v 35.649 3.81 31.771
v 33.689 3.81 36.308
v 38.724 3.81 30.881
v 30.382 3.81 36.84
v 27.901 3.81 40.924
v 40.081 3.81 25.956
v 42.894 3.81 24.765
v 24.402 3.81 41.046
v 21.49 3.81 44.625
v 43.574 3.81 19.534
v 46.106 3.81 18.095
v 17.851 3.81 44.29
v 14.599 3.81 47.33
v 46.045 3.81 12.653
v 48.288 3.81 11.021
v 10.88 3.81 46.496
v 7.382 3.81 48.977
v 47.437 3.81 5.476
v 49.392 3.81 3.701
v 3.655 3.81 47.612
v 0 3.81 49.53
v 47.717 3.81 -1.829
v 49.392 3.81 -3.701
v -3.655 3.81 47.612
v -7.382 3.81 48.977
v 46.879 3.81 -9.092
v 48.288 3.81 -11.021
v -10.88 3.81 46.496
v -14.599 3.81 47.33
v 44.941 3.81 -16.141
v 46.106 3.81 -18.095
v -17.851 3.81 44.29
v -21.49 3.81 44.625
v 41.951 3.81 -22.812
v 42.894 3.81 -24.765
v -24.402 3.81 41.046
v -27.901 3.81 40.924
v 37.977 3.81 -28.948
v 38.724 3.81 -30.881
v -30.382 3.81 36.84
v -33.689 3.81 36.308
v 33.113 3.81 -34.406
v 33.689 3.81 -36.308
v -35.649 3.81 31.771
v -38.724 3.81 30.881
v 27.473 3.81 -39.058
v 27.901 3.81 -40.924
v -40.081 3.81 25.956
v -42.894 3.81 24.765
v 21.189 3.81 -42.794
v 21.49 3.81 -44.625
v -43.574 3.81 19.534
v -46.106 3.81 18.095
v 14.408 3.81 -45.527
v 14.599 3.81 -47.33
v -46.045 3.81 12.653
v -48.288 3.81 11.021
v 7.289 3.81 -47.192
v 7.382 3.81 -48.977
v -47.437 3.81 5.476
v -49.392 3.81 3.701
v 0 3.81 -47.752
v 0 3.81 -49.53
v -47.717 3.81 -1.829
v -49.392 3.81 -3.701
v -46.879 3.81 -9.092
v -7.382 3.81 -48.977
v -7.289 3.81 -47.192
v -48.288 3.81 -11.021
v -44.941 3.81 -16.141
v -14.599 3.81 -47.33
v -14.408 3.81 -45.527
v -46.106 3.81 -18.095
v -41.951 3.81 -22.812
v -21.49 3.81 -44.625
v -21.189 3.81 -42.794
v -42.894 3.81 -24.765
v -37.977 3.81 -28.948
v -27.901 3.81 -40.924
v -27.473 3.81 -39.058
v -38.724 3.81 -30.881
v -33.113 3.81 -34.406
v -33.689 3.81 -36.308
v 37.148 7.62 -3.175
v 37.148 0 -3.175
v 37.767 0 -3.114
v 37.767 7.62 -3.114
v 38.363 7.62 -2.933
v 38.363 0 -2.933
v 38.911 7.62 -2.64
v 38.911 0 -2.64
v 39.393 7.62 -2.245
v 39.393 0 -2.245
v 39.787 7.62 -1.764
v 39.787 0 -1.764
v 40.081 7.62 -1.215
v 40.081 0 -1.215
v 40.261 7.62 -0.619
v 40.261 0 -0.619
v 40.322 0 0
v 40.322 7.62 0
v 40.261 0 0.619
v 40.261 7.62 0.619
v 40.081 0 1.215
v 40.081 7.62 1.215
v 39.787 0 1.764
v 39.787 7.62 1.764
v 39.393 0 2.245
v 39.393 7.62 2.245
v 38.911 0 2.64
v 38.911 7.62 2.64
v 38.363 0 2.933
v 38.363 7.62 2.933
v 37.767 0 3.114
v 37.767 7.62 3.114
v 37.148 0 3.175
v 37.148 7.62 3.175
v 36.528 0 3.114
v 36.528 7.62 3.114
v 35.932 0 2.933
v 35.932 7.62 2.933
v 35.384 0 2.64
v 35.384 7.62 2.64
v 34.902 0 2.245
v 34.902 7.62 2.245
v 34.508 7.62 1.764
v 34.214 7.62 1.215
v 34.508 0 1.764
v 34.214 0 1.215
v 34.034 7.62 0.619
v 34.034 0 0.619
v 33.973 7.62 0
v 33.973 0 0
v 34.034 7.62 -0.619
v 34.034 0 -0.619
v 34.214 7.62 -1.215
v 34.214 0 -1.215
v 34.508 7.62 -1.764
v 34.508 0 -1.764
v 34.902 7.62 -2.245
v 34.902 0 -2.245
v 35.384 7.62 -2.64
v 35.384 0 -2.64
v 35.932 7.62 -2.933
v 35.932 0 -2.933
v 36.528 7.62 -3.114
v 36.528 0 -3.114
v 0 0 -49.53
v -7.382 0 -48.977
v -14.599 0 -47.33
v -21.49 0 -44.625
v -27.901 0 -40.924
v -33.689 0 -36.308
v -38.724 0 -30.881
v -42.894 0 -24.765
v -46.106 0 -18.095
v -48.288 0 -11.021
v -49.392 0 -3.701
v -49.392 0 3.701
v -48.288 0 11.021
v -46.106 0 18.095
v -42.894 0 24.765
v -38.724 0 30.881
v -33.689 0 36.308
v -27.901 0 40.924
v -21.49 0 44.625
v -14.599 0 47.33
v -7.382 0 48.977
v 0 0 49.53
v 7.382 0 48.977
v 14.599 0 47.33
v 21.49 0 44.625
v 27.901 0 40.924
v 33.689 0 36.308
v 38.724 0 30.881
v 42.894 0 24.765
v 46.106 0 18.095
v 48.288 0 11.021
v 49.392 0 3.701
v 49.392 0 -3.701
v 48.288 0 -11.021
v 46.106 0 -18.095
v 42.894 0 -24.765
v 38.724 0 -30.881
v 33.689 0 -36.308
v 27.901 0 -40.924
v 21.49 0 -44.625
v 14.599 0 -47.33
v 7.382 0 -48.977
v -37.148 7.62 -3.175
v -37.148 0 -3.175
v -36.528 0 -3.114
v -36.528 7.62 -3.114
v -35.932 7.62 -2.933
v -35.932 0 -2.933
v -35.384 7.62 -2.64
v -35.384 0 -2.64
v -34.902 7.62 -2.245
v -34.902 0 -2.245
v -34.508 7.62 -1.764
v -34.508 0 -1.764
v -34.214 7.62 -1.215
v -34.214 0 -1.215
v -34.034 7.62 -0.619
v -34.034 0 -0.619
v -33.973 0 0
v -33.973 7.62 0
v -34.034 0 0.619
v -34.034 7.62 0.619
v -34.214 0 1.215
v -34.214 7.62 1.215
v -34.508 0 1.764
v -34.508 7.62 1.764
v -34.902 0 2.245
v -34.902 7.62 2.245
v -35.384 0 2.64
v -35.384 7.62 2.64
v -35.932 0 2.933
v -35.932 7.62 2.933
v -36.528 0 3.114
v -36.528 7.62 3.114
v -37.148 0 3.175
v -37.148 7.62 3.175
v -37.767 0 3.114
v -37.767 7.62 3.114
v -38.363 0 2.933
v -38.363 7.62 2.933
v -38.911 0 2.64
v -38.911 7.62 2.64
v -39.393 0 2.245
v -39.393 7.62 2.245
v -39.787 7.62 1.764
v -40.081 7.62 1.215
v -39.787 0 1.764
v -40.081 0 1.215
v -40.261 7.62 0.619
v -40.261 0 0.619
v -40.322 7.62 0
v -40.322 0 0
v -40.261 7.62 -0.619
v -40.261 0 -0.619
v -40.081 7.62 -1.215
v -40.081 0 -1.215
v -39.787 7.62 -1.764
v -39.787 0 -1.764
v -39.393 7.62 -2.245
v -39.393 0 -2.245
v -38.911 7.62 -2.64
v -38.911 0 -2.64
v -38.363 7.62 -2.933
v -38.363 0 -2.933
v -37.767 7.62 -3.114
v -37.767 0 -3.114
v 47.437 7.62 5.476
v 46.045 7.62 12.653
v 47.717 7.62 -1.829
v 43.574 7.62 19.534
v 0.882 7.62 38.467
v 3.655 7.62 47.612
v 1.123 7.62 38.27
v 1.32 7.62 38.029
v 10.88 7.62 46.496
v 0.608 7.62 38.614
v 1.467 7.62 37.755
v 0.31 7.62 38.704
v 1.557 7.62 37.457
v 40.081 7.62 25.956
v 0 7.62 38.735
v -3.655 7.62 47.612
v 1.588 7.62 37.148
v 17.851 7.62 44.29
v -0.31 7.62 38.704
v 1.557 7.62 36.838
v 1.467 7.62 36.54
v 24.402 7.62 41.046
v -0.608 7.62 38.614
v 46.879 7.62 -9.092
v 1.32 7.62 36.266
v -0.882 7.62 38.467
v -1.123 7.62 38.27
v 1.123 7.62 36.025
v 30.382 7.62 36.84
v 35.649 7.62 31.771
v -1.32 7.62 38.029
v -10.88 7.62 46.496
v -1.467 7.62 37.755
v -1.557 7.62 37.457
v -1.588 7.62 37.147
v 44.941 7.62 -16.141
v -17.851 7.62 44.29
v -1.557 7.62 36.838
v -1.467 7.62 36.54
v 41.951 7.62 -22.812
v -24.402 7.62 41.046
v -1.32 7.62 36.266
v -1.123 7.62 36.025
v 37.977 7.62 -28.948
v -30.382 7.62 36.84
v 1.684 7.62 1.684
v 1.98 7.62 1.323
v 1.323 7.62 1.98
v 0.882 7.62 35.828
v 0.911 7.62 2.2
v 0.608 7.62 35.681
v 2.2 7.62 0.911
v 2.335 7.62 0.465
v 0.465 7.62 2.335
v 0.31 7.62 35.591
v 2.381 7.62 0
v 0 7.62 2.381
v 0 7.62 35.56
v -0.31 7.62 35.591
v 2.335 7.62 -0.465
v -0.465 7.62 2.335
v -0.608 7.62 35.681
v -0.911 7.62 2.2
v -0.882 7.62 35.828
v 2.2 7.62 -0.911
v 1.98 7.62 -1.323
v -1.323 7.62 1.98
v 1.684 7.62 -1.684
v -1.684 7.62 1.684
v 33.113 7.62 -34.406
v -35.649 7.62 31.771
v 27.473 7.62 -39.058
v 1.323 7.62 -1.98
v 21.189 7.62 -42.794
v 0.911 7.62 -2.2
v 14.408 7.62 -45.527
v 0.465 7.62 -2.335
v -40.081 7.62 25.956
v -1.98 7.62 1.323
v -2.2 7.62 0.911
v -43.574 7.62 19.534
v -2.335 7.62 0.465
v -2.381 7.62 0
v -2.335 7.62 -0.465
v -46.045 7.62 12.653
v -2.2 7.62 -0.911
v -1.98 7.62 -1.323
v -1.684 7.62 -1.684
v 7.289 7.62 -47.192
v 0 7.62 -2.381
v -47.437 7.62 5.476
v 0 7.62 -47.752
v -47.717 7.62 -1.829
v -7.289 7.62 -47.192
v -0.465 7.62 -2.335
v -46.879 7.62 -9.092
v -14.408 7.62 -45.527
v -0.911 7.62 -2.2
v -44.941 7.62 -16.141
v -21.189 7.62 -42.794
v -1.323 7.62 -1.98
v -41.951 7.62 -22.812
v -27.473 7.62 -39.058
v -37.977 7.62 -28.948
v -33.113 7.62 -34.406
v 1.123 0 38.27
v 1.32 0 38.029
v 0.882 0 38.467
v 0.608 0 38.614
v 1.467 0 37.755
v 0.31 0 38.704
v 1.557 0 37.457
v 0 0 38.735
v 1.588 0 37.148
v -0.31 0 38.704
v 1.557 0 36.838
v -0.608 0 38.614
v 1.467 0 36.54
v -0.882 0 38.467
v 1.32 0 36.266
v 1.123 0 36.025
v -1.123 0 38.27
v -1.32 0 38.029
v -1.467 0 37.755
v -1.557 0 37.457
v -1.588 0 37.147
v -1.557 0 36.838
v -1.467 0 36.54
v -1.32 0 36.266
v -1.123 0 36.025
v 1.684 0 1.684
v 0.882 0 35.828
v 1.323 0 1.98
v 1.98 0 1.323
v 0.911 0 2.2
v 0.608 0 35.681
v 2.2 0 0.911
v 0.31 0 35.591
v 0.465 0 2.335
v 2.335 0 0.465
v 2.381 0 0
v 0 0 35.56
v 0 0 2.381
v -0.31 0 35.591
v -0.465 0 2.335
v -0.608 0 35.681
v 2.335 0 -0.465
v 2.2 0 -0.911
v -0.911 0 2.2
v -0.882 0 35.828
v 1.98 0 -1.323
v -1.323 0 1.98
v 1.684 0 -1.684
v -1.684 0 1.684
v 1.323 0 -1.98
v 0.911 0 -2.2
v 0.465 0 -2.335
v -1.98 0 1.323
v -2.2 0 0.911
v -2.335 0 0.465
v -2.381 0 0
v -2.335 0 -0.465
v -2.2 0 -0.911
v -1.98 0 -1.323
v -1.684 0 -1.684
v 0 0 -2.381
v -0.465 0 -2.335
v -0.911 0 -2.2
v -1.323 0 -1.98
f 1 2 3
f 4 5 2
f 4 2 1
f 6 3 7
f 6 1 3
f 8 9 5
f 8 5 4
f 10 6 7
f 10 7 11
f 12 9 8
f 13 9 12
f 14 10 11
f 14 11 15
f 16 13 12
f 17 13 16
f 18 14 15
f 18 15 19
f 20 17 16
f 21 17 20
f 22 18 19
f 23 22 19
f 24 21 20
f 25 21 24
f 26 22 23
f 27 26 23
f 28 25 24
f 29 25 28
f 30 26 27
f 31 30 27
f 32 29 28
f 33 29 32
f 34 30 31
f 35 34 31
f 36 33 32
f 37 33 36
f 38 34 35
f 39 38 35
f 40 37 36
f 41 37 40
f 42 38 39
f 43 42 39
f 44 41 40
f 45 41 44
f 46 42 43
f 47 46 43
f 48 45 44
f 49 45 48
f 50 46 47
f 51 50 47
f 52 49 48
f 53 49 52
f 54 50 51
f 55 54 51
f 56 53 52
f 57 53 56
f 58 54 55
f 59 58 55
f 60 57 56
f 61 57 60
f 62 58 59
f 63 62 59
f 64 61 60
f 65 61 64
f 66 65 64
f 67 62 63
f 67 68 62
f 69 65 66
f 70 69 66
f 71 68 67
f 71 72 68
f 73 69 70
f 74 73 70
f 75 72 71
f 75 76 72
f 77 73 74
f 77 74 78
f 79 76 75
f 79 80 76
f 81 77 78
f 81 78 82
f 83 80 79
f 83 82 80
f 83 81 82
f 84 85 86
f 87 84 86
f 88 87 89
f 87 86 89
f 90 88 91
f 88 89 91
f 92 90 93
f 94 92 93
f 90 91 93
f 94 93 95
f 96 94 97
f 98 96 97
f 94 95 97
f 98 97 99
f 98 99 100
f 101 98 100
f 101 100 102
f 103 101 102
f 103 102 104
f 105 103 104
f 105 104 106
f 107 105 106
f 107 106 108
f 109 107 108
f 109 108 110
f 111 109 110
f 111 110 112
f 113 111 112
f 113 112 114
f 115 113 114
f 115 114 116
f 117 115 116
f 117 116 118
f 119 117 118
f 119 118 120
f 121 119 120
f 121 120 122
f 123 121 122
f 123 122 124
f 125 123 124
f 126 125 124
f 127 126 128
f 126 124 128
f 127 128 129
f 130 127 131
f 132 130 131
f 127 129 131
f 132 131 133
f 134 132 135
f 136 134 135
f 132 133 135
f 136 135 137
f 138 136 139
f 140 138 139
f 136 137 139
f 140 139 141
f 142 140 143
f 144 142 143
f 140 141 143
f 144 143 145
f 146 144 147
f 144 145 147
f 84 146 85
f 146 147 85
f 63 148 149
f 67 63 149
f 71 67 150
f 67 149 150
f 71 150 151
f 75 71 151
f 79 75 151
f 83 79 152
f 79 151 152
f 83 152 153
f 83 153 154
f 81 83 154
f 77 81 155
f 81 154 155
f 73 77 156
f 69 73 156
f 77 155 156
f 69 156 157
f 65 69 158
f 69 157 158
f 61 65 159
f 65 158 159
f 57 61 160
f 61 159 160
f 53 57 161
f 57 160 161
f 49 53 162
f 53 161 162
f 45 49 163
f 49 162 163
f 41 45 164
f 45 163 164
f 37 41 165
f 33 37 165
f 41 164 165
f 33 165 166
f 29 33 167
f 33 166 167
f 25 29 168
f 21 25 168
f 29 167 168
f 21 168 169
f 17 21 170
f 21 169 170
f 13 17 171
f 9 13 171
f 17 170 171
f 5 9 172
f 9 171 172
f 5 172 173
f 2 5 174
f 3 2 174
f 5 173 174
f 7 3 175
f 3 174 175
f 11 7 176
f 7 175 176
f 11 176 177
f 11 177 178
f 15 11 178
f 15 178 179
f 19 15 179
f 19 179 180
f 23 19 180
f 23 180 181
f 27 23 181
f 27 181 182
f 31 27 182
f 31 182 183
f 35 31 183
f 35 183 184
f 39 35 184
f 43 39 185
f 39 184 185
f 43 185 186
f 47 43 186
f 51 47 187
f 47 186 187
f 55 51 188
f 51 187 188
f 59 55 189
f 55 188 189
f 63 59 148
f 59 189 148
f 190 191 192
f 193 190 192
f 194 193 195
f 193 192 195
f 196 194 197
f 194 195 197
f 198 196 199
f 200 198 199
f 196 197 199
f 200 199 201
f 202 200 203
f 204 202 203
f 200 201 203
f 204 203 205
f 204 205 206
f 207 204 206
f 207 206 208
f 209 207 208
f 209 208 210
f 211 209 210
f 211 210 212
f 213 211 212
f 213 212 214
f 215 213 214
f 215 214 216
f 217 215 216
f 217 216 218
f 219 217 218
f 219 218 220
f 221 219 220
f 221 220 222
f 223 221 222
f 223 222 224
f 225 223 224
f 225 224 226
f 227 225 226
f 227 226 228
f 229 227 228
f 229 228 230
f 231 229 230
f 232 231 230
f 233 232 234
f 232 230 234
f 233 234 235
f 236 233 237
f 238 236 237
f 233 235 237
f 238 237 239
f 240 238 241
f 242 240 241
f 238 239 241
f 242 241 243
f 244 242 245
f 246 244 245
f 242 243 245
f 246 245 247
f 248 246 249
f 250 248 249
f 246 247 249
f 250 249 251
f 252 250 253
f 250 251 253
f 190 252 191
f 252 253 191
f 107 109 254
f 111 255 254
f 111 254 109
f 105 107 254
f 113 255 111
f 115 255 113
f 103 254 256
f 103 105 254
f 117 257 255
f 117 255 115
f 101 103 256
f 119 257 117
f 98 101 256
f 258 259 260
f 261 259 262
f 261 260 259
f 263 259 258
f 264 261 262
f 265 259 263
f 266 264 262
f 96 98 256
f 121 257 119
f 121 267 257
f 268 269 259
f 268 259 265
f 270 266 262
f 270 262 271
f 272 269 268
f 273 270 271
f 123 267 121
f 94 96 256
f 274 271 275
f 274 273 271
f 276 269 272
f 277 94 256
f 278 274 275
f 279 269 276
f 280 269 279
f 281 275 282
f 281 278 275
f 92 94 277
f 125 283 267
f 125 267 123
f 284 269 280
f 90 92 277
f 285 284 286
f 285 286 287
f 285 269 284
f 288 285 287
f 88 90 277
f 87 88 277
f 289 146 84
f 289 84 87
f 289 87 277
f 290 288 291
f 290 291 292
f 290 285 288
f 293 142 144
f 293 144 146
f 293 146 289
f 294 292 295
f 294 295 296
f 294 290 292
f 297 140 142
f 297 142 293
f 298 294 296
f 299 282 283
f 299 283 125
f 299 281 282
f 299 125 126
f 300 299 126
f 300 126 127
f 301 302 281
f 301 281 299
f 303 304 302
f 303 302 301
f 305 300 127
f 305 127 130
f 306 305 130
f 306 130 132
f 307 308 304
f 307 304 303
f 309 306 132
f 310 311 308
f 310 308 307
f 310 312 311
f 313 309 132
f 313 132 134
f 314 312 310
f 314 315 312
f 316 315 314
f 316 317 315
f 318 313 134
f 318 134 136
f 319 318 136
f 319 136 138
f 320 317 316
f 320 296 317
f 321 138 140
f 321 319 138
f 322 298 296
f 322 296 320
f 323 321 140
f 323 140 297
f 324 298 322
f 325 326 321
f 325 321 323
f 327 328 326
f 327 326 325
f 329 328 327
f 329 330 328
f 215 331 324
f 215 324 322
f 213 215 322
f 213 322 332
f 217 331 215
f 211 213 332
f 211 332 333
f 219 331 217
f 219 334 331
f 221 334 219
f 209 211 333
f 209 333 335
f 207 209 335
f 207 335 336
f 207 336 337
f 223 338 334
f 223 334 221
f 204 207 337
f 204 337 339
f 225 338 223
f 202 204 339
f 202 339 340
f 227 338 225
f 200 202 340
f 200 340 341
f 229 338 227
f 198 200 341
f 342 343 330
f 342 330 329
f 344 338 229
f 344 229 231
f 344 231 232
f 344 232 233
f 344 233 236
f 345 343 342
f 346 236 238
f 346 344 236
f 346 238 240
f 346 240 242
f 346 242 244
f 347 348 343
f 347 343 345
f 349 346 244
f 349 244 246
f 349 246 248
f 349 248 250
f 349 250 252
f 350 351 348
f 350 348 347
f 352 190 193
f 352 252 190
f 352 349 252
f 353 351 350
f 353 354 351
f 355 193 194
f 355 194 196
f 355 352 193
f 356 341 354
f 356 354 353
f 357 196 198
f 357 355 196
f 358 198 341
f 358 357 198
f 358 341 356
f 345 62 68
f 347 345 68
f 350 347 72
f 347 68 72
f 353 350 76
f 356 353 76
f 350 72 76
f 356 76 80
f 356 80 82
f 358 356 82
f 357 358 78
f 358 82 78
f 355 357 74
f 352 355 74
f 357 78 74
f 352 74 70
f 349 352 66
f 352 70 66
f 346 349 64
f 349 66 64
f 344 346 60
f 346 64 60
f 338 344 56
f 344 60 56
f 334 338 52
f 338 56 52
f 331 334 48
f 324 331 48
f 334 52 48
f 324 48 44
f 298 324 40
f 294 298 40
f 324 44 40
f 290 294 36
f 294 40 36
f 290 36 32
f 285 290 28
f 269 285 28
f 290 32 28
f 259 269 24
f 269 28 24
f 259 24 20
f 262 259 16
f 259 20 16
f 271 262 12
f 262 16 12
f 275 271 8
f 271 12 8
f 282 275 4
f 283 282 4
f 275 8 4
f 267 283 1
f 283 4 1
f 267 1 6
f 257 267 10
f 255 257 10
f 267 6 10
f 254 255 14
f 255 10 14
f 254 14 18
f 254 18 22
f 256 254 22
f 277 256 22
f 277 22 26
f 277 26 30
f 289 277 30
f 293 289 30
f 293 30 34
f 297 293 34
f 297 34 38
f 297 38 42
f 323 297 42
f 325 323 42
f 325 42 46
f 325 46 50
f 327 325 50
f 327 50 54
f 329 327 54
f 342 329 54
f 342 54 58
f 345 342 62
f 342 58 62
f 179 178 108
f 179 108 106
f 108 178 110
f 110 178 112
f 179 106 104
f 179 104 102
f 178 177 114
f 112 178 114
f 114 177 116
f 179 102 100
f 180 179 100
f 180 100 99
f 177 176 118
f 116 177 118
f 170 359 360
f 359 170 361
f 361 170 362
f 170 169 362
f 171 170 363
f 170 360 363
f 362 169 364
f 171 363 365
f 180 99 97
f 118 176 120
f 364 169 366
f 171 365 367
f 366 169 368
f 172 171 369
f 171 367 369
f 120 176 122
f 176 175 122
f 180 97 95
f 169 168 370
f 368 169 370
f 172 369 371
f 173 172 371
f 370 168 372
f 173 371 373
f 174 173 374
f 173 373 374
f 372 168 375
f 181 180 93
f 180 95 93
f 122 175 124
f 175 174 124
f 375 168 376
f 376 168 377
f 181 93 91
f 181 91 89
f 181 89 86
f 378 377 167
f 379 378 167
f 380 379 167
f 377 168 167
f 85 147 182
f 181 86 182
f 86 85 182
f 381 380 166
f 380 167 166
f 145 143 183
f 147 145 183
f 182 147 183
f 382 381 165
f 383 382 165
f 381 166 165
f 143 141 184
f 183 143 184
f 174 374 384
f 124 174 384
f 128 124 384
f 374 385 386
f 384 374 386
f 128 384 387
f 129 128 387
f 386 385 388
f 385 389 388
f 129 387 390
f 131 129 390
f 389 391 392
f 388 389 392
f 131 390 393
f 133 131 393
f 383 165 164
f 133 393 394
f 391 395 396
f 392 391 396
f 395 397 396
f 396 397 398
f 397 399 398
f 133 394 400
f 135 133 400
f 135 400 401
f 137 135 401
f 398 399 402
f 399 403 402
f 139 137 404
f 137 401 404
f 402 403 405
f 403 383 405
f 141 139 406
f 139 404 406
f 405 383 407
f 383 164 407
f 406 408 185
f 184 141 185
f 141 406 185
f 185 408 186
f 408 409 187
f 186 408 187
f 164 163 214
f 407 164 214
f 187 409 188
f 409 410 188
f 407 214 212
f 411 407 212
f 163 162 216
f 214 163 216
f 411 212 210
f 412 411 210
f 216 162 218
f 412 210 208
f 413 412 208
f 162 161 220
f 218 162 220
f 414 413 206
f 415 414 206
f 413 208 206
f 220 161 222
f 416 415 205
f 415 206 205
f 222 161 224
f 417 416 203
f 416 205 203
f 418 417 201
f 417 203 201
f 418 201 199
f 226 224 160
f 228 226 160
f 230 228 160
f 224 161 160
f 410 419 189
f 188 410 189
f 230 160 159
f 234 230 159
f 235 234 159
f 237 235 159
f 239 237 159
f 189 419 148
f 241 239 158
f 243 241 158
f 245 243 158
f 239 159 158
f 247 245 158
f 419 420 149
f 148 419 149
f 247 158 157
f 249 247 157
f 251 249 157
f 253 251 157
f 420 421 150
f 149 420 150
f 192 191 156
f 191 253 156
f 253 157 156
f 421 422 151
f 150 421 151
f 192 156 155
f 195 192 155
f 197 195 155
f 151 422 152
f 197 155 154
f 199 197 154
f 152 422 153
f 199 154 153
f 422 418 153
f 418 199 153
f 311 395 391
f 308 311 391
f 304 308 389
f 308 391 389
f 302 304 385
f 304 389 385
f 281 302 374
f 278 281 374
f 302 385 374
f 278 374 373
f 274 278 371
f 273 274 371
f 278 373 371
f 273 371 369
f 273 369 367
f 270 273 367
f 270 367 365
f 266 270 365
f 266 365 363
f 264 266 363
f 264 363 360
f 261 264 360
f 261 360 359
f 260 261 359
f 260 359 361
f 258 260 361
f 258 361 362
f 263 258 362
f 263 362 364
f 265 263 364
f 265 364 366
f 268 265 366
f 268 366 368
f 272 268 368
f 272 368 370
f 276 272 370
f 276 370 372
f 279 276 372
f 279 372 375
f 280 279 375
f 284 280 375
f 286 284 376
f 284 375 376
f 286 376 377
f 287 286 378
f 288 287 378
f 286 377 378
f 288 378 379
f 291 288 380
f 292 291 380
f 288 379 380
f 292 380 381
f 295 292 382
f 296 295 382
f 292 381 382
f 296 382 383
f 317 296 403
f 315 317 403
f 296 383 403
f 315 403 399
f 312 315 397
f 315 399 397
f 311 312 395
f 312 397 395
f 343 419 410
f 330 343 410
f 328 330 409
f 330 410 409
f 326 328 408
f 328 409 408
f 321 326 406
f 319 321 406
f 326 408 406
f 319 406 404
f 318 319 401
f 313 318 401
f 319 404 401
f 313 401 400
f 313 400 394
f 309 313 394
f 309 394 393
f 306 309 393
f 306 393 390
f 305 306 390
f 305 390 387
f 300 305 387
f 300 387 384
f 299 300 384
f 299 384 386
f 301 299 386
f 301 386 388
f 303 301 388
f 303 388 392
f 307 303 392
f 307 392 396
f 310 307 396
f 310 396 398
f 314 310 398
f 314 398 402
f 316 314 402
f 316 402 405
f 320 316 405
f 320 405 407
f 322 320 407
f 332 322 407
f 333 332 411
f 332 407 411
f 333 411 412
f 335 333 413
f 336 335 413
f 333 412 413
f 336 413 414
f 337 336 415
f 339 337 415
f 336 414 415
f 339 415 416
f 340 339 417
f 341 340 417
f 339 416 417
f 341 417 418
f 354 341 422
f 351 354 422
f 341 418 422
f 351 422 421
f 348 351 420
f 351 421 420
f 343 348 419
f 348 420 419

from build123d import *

# Parameters (mm, degrees)
SKETCH2_R           = 49.53
BOSS_EXTRUDE1_DEPTH = 3.81
SKETCH3_R           = 47.752
BOSS_EXTRUDE2_DEPTH = 3.81
SKETCH5_R           = 3.175
SKETCH5_R_2         = 1.5875
SKETCH5_R_3         = 2.38125
CUT_EXTRUDE1_DEPTH  = 17.526


with BuildPart() as part:
    # Sketch2 → Boss-Extrude1 (new body)
    with BuildSketch(Plane(origin=(0, 0, 0), x_dir=(1, 0, 0), z_dir=(0, 1, 0))):
        with Locations(Location((0, 0, 0), (0, 0, 90))):
            Circle(SKETCH2_R)
    extrude(amount=BOSS_EXTRUDE1_DEPTH)

    # Sketch3 → Boss-Extrude2 (add)
    with BuildSketch(Plane(origin=(0, 3.81, 0), x_dir=(1, 0, 0), z_dir=(0, 1, 0))):
        with Locations(Location((0, 0, 0), (0, 0, 90))):
            Circle(SKETCH3_R)
    extrude(amount=BOSS_EXTRUDE2_DEPTH)

    # Sketch5 → Cut-Extrude1 (cut)
    with BuildSketch(Plane.XZ):
        with Locations(Location((37.1475, 0, 0), (0, 0, 270))):
            Circle(SKETCH5_R)
        with Locations(Location((-37.1475, 0, 0), (0, 0, 270))):
            Circle(SKETCH5_R)
        with Locations(Location((0, 37.1475, 0), (0, 0, 270))):
            Circle(SKETCH5_R_2)
        with Locations(Location((0, 0, 0), (0, 0, 270))):
            Circle(SKETCH5_R_3)
    extrude(amount=-CUT_EXTRUDE1_DEPTH, mode=Mode.SUBTRACT)


solid = part.part
